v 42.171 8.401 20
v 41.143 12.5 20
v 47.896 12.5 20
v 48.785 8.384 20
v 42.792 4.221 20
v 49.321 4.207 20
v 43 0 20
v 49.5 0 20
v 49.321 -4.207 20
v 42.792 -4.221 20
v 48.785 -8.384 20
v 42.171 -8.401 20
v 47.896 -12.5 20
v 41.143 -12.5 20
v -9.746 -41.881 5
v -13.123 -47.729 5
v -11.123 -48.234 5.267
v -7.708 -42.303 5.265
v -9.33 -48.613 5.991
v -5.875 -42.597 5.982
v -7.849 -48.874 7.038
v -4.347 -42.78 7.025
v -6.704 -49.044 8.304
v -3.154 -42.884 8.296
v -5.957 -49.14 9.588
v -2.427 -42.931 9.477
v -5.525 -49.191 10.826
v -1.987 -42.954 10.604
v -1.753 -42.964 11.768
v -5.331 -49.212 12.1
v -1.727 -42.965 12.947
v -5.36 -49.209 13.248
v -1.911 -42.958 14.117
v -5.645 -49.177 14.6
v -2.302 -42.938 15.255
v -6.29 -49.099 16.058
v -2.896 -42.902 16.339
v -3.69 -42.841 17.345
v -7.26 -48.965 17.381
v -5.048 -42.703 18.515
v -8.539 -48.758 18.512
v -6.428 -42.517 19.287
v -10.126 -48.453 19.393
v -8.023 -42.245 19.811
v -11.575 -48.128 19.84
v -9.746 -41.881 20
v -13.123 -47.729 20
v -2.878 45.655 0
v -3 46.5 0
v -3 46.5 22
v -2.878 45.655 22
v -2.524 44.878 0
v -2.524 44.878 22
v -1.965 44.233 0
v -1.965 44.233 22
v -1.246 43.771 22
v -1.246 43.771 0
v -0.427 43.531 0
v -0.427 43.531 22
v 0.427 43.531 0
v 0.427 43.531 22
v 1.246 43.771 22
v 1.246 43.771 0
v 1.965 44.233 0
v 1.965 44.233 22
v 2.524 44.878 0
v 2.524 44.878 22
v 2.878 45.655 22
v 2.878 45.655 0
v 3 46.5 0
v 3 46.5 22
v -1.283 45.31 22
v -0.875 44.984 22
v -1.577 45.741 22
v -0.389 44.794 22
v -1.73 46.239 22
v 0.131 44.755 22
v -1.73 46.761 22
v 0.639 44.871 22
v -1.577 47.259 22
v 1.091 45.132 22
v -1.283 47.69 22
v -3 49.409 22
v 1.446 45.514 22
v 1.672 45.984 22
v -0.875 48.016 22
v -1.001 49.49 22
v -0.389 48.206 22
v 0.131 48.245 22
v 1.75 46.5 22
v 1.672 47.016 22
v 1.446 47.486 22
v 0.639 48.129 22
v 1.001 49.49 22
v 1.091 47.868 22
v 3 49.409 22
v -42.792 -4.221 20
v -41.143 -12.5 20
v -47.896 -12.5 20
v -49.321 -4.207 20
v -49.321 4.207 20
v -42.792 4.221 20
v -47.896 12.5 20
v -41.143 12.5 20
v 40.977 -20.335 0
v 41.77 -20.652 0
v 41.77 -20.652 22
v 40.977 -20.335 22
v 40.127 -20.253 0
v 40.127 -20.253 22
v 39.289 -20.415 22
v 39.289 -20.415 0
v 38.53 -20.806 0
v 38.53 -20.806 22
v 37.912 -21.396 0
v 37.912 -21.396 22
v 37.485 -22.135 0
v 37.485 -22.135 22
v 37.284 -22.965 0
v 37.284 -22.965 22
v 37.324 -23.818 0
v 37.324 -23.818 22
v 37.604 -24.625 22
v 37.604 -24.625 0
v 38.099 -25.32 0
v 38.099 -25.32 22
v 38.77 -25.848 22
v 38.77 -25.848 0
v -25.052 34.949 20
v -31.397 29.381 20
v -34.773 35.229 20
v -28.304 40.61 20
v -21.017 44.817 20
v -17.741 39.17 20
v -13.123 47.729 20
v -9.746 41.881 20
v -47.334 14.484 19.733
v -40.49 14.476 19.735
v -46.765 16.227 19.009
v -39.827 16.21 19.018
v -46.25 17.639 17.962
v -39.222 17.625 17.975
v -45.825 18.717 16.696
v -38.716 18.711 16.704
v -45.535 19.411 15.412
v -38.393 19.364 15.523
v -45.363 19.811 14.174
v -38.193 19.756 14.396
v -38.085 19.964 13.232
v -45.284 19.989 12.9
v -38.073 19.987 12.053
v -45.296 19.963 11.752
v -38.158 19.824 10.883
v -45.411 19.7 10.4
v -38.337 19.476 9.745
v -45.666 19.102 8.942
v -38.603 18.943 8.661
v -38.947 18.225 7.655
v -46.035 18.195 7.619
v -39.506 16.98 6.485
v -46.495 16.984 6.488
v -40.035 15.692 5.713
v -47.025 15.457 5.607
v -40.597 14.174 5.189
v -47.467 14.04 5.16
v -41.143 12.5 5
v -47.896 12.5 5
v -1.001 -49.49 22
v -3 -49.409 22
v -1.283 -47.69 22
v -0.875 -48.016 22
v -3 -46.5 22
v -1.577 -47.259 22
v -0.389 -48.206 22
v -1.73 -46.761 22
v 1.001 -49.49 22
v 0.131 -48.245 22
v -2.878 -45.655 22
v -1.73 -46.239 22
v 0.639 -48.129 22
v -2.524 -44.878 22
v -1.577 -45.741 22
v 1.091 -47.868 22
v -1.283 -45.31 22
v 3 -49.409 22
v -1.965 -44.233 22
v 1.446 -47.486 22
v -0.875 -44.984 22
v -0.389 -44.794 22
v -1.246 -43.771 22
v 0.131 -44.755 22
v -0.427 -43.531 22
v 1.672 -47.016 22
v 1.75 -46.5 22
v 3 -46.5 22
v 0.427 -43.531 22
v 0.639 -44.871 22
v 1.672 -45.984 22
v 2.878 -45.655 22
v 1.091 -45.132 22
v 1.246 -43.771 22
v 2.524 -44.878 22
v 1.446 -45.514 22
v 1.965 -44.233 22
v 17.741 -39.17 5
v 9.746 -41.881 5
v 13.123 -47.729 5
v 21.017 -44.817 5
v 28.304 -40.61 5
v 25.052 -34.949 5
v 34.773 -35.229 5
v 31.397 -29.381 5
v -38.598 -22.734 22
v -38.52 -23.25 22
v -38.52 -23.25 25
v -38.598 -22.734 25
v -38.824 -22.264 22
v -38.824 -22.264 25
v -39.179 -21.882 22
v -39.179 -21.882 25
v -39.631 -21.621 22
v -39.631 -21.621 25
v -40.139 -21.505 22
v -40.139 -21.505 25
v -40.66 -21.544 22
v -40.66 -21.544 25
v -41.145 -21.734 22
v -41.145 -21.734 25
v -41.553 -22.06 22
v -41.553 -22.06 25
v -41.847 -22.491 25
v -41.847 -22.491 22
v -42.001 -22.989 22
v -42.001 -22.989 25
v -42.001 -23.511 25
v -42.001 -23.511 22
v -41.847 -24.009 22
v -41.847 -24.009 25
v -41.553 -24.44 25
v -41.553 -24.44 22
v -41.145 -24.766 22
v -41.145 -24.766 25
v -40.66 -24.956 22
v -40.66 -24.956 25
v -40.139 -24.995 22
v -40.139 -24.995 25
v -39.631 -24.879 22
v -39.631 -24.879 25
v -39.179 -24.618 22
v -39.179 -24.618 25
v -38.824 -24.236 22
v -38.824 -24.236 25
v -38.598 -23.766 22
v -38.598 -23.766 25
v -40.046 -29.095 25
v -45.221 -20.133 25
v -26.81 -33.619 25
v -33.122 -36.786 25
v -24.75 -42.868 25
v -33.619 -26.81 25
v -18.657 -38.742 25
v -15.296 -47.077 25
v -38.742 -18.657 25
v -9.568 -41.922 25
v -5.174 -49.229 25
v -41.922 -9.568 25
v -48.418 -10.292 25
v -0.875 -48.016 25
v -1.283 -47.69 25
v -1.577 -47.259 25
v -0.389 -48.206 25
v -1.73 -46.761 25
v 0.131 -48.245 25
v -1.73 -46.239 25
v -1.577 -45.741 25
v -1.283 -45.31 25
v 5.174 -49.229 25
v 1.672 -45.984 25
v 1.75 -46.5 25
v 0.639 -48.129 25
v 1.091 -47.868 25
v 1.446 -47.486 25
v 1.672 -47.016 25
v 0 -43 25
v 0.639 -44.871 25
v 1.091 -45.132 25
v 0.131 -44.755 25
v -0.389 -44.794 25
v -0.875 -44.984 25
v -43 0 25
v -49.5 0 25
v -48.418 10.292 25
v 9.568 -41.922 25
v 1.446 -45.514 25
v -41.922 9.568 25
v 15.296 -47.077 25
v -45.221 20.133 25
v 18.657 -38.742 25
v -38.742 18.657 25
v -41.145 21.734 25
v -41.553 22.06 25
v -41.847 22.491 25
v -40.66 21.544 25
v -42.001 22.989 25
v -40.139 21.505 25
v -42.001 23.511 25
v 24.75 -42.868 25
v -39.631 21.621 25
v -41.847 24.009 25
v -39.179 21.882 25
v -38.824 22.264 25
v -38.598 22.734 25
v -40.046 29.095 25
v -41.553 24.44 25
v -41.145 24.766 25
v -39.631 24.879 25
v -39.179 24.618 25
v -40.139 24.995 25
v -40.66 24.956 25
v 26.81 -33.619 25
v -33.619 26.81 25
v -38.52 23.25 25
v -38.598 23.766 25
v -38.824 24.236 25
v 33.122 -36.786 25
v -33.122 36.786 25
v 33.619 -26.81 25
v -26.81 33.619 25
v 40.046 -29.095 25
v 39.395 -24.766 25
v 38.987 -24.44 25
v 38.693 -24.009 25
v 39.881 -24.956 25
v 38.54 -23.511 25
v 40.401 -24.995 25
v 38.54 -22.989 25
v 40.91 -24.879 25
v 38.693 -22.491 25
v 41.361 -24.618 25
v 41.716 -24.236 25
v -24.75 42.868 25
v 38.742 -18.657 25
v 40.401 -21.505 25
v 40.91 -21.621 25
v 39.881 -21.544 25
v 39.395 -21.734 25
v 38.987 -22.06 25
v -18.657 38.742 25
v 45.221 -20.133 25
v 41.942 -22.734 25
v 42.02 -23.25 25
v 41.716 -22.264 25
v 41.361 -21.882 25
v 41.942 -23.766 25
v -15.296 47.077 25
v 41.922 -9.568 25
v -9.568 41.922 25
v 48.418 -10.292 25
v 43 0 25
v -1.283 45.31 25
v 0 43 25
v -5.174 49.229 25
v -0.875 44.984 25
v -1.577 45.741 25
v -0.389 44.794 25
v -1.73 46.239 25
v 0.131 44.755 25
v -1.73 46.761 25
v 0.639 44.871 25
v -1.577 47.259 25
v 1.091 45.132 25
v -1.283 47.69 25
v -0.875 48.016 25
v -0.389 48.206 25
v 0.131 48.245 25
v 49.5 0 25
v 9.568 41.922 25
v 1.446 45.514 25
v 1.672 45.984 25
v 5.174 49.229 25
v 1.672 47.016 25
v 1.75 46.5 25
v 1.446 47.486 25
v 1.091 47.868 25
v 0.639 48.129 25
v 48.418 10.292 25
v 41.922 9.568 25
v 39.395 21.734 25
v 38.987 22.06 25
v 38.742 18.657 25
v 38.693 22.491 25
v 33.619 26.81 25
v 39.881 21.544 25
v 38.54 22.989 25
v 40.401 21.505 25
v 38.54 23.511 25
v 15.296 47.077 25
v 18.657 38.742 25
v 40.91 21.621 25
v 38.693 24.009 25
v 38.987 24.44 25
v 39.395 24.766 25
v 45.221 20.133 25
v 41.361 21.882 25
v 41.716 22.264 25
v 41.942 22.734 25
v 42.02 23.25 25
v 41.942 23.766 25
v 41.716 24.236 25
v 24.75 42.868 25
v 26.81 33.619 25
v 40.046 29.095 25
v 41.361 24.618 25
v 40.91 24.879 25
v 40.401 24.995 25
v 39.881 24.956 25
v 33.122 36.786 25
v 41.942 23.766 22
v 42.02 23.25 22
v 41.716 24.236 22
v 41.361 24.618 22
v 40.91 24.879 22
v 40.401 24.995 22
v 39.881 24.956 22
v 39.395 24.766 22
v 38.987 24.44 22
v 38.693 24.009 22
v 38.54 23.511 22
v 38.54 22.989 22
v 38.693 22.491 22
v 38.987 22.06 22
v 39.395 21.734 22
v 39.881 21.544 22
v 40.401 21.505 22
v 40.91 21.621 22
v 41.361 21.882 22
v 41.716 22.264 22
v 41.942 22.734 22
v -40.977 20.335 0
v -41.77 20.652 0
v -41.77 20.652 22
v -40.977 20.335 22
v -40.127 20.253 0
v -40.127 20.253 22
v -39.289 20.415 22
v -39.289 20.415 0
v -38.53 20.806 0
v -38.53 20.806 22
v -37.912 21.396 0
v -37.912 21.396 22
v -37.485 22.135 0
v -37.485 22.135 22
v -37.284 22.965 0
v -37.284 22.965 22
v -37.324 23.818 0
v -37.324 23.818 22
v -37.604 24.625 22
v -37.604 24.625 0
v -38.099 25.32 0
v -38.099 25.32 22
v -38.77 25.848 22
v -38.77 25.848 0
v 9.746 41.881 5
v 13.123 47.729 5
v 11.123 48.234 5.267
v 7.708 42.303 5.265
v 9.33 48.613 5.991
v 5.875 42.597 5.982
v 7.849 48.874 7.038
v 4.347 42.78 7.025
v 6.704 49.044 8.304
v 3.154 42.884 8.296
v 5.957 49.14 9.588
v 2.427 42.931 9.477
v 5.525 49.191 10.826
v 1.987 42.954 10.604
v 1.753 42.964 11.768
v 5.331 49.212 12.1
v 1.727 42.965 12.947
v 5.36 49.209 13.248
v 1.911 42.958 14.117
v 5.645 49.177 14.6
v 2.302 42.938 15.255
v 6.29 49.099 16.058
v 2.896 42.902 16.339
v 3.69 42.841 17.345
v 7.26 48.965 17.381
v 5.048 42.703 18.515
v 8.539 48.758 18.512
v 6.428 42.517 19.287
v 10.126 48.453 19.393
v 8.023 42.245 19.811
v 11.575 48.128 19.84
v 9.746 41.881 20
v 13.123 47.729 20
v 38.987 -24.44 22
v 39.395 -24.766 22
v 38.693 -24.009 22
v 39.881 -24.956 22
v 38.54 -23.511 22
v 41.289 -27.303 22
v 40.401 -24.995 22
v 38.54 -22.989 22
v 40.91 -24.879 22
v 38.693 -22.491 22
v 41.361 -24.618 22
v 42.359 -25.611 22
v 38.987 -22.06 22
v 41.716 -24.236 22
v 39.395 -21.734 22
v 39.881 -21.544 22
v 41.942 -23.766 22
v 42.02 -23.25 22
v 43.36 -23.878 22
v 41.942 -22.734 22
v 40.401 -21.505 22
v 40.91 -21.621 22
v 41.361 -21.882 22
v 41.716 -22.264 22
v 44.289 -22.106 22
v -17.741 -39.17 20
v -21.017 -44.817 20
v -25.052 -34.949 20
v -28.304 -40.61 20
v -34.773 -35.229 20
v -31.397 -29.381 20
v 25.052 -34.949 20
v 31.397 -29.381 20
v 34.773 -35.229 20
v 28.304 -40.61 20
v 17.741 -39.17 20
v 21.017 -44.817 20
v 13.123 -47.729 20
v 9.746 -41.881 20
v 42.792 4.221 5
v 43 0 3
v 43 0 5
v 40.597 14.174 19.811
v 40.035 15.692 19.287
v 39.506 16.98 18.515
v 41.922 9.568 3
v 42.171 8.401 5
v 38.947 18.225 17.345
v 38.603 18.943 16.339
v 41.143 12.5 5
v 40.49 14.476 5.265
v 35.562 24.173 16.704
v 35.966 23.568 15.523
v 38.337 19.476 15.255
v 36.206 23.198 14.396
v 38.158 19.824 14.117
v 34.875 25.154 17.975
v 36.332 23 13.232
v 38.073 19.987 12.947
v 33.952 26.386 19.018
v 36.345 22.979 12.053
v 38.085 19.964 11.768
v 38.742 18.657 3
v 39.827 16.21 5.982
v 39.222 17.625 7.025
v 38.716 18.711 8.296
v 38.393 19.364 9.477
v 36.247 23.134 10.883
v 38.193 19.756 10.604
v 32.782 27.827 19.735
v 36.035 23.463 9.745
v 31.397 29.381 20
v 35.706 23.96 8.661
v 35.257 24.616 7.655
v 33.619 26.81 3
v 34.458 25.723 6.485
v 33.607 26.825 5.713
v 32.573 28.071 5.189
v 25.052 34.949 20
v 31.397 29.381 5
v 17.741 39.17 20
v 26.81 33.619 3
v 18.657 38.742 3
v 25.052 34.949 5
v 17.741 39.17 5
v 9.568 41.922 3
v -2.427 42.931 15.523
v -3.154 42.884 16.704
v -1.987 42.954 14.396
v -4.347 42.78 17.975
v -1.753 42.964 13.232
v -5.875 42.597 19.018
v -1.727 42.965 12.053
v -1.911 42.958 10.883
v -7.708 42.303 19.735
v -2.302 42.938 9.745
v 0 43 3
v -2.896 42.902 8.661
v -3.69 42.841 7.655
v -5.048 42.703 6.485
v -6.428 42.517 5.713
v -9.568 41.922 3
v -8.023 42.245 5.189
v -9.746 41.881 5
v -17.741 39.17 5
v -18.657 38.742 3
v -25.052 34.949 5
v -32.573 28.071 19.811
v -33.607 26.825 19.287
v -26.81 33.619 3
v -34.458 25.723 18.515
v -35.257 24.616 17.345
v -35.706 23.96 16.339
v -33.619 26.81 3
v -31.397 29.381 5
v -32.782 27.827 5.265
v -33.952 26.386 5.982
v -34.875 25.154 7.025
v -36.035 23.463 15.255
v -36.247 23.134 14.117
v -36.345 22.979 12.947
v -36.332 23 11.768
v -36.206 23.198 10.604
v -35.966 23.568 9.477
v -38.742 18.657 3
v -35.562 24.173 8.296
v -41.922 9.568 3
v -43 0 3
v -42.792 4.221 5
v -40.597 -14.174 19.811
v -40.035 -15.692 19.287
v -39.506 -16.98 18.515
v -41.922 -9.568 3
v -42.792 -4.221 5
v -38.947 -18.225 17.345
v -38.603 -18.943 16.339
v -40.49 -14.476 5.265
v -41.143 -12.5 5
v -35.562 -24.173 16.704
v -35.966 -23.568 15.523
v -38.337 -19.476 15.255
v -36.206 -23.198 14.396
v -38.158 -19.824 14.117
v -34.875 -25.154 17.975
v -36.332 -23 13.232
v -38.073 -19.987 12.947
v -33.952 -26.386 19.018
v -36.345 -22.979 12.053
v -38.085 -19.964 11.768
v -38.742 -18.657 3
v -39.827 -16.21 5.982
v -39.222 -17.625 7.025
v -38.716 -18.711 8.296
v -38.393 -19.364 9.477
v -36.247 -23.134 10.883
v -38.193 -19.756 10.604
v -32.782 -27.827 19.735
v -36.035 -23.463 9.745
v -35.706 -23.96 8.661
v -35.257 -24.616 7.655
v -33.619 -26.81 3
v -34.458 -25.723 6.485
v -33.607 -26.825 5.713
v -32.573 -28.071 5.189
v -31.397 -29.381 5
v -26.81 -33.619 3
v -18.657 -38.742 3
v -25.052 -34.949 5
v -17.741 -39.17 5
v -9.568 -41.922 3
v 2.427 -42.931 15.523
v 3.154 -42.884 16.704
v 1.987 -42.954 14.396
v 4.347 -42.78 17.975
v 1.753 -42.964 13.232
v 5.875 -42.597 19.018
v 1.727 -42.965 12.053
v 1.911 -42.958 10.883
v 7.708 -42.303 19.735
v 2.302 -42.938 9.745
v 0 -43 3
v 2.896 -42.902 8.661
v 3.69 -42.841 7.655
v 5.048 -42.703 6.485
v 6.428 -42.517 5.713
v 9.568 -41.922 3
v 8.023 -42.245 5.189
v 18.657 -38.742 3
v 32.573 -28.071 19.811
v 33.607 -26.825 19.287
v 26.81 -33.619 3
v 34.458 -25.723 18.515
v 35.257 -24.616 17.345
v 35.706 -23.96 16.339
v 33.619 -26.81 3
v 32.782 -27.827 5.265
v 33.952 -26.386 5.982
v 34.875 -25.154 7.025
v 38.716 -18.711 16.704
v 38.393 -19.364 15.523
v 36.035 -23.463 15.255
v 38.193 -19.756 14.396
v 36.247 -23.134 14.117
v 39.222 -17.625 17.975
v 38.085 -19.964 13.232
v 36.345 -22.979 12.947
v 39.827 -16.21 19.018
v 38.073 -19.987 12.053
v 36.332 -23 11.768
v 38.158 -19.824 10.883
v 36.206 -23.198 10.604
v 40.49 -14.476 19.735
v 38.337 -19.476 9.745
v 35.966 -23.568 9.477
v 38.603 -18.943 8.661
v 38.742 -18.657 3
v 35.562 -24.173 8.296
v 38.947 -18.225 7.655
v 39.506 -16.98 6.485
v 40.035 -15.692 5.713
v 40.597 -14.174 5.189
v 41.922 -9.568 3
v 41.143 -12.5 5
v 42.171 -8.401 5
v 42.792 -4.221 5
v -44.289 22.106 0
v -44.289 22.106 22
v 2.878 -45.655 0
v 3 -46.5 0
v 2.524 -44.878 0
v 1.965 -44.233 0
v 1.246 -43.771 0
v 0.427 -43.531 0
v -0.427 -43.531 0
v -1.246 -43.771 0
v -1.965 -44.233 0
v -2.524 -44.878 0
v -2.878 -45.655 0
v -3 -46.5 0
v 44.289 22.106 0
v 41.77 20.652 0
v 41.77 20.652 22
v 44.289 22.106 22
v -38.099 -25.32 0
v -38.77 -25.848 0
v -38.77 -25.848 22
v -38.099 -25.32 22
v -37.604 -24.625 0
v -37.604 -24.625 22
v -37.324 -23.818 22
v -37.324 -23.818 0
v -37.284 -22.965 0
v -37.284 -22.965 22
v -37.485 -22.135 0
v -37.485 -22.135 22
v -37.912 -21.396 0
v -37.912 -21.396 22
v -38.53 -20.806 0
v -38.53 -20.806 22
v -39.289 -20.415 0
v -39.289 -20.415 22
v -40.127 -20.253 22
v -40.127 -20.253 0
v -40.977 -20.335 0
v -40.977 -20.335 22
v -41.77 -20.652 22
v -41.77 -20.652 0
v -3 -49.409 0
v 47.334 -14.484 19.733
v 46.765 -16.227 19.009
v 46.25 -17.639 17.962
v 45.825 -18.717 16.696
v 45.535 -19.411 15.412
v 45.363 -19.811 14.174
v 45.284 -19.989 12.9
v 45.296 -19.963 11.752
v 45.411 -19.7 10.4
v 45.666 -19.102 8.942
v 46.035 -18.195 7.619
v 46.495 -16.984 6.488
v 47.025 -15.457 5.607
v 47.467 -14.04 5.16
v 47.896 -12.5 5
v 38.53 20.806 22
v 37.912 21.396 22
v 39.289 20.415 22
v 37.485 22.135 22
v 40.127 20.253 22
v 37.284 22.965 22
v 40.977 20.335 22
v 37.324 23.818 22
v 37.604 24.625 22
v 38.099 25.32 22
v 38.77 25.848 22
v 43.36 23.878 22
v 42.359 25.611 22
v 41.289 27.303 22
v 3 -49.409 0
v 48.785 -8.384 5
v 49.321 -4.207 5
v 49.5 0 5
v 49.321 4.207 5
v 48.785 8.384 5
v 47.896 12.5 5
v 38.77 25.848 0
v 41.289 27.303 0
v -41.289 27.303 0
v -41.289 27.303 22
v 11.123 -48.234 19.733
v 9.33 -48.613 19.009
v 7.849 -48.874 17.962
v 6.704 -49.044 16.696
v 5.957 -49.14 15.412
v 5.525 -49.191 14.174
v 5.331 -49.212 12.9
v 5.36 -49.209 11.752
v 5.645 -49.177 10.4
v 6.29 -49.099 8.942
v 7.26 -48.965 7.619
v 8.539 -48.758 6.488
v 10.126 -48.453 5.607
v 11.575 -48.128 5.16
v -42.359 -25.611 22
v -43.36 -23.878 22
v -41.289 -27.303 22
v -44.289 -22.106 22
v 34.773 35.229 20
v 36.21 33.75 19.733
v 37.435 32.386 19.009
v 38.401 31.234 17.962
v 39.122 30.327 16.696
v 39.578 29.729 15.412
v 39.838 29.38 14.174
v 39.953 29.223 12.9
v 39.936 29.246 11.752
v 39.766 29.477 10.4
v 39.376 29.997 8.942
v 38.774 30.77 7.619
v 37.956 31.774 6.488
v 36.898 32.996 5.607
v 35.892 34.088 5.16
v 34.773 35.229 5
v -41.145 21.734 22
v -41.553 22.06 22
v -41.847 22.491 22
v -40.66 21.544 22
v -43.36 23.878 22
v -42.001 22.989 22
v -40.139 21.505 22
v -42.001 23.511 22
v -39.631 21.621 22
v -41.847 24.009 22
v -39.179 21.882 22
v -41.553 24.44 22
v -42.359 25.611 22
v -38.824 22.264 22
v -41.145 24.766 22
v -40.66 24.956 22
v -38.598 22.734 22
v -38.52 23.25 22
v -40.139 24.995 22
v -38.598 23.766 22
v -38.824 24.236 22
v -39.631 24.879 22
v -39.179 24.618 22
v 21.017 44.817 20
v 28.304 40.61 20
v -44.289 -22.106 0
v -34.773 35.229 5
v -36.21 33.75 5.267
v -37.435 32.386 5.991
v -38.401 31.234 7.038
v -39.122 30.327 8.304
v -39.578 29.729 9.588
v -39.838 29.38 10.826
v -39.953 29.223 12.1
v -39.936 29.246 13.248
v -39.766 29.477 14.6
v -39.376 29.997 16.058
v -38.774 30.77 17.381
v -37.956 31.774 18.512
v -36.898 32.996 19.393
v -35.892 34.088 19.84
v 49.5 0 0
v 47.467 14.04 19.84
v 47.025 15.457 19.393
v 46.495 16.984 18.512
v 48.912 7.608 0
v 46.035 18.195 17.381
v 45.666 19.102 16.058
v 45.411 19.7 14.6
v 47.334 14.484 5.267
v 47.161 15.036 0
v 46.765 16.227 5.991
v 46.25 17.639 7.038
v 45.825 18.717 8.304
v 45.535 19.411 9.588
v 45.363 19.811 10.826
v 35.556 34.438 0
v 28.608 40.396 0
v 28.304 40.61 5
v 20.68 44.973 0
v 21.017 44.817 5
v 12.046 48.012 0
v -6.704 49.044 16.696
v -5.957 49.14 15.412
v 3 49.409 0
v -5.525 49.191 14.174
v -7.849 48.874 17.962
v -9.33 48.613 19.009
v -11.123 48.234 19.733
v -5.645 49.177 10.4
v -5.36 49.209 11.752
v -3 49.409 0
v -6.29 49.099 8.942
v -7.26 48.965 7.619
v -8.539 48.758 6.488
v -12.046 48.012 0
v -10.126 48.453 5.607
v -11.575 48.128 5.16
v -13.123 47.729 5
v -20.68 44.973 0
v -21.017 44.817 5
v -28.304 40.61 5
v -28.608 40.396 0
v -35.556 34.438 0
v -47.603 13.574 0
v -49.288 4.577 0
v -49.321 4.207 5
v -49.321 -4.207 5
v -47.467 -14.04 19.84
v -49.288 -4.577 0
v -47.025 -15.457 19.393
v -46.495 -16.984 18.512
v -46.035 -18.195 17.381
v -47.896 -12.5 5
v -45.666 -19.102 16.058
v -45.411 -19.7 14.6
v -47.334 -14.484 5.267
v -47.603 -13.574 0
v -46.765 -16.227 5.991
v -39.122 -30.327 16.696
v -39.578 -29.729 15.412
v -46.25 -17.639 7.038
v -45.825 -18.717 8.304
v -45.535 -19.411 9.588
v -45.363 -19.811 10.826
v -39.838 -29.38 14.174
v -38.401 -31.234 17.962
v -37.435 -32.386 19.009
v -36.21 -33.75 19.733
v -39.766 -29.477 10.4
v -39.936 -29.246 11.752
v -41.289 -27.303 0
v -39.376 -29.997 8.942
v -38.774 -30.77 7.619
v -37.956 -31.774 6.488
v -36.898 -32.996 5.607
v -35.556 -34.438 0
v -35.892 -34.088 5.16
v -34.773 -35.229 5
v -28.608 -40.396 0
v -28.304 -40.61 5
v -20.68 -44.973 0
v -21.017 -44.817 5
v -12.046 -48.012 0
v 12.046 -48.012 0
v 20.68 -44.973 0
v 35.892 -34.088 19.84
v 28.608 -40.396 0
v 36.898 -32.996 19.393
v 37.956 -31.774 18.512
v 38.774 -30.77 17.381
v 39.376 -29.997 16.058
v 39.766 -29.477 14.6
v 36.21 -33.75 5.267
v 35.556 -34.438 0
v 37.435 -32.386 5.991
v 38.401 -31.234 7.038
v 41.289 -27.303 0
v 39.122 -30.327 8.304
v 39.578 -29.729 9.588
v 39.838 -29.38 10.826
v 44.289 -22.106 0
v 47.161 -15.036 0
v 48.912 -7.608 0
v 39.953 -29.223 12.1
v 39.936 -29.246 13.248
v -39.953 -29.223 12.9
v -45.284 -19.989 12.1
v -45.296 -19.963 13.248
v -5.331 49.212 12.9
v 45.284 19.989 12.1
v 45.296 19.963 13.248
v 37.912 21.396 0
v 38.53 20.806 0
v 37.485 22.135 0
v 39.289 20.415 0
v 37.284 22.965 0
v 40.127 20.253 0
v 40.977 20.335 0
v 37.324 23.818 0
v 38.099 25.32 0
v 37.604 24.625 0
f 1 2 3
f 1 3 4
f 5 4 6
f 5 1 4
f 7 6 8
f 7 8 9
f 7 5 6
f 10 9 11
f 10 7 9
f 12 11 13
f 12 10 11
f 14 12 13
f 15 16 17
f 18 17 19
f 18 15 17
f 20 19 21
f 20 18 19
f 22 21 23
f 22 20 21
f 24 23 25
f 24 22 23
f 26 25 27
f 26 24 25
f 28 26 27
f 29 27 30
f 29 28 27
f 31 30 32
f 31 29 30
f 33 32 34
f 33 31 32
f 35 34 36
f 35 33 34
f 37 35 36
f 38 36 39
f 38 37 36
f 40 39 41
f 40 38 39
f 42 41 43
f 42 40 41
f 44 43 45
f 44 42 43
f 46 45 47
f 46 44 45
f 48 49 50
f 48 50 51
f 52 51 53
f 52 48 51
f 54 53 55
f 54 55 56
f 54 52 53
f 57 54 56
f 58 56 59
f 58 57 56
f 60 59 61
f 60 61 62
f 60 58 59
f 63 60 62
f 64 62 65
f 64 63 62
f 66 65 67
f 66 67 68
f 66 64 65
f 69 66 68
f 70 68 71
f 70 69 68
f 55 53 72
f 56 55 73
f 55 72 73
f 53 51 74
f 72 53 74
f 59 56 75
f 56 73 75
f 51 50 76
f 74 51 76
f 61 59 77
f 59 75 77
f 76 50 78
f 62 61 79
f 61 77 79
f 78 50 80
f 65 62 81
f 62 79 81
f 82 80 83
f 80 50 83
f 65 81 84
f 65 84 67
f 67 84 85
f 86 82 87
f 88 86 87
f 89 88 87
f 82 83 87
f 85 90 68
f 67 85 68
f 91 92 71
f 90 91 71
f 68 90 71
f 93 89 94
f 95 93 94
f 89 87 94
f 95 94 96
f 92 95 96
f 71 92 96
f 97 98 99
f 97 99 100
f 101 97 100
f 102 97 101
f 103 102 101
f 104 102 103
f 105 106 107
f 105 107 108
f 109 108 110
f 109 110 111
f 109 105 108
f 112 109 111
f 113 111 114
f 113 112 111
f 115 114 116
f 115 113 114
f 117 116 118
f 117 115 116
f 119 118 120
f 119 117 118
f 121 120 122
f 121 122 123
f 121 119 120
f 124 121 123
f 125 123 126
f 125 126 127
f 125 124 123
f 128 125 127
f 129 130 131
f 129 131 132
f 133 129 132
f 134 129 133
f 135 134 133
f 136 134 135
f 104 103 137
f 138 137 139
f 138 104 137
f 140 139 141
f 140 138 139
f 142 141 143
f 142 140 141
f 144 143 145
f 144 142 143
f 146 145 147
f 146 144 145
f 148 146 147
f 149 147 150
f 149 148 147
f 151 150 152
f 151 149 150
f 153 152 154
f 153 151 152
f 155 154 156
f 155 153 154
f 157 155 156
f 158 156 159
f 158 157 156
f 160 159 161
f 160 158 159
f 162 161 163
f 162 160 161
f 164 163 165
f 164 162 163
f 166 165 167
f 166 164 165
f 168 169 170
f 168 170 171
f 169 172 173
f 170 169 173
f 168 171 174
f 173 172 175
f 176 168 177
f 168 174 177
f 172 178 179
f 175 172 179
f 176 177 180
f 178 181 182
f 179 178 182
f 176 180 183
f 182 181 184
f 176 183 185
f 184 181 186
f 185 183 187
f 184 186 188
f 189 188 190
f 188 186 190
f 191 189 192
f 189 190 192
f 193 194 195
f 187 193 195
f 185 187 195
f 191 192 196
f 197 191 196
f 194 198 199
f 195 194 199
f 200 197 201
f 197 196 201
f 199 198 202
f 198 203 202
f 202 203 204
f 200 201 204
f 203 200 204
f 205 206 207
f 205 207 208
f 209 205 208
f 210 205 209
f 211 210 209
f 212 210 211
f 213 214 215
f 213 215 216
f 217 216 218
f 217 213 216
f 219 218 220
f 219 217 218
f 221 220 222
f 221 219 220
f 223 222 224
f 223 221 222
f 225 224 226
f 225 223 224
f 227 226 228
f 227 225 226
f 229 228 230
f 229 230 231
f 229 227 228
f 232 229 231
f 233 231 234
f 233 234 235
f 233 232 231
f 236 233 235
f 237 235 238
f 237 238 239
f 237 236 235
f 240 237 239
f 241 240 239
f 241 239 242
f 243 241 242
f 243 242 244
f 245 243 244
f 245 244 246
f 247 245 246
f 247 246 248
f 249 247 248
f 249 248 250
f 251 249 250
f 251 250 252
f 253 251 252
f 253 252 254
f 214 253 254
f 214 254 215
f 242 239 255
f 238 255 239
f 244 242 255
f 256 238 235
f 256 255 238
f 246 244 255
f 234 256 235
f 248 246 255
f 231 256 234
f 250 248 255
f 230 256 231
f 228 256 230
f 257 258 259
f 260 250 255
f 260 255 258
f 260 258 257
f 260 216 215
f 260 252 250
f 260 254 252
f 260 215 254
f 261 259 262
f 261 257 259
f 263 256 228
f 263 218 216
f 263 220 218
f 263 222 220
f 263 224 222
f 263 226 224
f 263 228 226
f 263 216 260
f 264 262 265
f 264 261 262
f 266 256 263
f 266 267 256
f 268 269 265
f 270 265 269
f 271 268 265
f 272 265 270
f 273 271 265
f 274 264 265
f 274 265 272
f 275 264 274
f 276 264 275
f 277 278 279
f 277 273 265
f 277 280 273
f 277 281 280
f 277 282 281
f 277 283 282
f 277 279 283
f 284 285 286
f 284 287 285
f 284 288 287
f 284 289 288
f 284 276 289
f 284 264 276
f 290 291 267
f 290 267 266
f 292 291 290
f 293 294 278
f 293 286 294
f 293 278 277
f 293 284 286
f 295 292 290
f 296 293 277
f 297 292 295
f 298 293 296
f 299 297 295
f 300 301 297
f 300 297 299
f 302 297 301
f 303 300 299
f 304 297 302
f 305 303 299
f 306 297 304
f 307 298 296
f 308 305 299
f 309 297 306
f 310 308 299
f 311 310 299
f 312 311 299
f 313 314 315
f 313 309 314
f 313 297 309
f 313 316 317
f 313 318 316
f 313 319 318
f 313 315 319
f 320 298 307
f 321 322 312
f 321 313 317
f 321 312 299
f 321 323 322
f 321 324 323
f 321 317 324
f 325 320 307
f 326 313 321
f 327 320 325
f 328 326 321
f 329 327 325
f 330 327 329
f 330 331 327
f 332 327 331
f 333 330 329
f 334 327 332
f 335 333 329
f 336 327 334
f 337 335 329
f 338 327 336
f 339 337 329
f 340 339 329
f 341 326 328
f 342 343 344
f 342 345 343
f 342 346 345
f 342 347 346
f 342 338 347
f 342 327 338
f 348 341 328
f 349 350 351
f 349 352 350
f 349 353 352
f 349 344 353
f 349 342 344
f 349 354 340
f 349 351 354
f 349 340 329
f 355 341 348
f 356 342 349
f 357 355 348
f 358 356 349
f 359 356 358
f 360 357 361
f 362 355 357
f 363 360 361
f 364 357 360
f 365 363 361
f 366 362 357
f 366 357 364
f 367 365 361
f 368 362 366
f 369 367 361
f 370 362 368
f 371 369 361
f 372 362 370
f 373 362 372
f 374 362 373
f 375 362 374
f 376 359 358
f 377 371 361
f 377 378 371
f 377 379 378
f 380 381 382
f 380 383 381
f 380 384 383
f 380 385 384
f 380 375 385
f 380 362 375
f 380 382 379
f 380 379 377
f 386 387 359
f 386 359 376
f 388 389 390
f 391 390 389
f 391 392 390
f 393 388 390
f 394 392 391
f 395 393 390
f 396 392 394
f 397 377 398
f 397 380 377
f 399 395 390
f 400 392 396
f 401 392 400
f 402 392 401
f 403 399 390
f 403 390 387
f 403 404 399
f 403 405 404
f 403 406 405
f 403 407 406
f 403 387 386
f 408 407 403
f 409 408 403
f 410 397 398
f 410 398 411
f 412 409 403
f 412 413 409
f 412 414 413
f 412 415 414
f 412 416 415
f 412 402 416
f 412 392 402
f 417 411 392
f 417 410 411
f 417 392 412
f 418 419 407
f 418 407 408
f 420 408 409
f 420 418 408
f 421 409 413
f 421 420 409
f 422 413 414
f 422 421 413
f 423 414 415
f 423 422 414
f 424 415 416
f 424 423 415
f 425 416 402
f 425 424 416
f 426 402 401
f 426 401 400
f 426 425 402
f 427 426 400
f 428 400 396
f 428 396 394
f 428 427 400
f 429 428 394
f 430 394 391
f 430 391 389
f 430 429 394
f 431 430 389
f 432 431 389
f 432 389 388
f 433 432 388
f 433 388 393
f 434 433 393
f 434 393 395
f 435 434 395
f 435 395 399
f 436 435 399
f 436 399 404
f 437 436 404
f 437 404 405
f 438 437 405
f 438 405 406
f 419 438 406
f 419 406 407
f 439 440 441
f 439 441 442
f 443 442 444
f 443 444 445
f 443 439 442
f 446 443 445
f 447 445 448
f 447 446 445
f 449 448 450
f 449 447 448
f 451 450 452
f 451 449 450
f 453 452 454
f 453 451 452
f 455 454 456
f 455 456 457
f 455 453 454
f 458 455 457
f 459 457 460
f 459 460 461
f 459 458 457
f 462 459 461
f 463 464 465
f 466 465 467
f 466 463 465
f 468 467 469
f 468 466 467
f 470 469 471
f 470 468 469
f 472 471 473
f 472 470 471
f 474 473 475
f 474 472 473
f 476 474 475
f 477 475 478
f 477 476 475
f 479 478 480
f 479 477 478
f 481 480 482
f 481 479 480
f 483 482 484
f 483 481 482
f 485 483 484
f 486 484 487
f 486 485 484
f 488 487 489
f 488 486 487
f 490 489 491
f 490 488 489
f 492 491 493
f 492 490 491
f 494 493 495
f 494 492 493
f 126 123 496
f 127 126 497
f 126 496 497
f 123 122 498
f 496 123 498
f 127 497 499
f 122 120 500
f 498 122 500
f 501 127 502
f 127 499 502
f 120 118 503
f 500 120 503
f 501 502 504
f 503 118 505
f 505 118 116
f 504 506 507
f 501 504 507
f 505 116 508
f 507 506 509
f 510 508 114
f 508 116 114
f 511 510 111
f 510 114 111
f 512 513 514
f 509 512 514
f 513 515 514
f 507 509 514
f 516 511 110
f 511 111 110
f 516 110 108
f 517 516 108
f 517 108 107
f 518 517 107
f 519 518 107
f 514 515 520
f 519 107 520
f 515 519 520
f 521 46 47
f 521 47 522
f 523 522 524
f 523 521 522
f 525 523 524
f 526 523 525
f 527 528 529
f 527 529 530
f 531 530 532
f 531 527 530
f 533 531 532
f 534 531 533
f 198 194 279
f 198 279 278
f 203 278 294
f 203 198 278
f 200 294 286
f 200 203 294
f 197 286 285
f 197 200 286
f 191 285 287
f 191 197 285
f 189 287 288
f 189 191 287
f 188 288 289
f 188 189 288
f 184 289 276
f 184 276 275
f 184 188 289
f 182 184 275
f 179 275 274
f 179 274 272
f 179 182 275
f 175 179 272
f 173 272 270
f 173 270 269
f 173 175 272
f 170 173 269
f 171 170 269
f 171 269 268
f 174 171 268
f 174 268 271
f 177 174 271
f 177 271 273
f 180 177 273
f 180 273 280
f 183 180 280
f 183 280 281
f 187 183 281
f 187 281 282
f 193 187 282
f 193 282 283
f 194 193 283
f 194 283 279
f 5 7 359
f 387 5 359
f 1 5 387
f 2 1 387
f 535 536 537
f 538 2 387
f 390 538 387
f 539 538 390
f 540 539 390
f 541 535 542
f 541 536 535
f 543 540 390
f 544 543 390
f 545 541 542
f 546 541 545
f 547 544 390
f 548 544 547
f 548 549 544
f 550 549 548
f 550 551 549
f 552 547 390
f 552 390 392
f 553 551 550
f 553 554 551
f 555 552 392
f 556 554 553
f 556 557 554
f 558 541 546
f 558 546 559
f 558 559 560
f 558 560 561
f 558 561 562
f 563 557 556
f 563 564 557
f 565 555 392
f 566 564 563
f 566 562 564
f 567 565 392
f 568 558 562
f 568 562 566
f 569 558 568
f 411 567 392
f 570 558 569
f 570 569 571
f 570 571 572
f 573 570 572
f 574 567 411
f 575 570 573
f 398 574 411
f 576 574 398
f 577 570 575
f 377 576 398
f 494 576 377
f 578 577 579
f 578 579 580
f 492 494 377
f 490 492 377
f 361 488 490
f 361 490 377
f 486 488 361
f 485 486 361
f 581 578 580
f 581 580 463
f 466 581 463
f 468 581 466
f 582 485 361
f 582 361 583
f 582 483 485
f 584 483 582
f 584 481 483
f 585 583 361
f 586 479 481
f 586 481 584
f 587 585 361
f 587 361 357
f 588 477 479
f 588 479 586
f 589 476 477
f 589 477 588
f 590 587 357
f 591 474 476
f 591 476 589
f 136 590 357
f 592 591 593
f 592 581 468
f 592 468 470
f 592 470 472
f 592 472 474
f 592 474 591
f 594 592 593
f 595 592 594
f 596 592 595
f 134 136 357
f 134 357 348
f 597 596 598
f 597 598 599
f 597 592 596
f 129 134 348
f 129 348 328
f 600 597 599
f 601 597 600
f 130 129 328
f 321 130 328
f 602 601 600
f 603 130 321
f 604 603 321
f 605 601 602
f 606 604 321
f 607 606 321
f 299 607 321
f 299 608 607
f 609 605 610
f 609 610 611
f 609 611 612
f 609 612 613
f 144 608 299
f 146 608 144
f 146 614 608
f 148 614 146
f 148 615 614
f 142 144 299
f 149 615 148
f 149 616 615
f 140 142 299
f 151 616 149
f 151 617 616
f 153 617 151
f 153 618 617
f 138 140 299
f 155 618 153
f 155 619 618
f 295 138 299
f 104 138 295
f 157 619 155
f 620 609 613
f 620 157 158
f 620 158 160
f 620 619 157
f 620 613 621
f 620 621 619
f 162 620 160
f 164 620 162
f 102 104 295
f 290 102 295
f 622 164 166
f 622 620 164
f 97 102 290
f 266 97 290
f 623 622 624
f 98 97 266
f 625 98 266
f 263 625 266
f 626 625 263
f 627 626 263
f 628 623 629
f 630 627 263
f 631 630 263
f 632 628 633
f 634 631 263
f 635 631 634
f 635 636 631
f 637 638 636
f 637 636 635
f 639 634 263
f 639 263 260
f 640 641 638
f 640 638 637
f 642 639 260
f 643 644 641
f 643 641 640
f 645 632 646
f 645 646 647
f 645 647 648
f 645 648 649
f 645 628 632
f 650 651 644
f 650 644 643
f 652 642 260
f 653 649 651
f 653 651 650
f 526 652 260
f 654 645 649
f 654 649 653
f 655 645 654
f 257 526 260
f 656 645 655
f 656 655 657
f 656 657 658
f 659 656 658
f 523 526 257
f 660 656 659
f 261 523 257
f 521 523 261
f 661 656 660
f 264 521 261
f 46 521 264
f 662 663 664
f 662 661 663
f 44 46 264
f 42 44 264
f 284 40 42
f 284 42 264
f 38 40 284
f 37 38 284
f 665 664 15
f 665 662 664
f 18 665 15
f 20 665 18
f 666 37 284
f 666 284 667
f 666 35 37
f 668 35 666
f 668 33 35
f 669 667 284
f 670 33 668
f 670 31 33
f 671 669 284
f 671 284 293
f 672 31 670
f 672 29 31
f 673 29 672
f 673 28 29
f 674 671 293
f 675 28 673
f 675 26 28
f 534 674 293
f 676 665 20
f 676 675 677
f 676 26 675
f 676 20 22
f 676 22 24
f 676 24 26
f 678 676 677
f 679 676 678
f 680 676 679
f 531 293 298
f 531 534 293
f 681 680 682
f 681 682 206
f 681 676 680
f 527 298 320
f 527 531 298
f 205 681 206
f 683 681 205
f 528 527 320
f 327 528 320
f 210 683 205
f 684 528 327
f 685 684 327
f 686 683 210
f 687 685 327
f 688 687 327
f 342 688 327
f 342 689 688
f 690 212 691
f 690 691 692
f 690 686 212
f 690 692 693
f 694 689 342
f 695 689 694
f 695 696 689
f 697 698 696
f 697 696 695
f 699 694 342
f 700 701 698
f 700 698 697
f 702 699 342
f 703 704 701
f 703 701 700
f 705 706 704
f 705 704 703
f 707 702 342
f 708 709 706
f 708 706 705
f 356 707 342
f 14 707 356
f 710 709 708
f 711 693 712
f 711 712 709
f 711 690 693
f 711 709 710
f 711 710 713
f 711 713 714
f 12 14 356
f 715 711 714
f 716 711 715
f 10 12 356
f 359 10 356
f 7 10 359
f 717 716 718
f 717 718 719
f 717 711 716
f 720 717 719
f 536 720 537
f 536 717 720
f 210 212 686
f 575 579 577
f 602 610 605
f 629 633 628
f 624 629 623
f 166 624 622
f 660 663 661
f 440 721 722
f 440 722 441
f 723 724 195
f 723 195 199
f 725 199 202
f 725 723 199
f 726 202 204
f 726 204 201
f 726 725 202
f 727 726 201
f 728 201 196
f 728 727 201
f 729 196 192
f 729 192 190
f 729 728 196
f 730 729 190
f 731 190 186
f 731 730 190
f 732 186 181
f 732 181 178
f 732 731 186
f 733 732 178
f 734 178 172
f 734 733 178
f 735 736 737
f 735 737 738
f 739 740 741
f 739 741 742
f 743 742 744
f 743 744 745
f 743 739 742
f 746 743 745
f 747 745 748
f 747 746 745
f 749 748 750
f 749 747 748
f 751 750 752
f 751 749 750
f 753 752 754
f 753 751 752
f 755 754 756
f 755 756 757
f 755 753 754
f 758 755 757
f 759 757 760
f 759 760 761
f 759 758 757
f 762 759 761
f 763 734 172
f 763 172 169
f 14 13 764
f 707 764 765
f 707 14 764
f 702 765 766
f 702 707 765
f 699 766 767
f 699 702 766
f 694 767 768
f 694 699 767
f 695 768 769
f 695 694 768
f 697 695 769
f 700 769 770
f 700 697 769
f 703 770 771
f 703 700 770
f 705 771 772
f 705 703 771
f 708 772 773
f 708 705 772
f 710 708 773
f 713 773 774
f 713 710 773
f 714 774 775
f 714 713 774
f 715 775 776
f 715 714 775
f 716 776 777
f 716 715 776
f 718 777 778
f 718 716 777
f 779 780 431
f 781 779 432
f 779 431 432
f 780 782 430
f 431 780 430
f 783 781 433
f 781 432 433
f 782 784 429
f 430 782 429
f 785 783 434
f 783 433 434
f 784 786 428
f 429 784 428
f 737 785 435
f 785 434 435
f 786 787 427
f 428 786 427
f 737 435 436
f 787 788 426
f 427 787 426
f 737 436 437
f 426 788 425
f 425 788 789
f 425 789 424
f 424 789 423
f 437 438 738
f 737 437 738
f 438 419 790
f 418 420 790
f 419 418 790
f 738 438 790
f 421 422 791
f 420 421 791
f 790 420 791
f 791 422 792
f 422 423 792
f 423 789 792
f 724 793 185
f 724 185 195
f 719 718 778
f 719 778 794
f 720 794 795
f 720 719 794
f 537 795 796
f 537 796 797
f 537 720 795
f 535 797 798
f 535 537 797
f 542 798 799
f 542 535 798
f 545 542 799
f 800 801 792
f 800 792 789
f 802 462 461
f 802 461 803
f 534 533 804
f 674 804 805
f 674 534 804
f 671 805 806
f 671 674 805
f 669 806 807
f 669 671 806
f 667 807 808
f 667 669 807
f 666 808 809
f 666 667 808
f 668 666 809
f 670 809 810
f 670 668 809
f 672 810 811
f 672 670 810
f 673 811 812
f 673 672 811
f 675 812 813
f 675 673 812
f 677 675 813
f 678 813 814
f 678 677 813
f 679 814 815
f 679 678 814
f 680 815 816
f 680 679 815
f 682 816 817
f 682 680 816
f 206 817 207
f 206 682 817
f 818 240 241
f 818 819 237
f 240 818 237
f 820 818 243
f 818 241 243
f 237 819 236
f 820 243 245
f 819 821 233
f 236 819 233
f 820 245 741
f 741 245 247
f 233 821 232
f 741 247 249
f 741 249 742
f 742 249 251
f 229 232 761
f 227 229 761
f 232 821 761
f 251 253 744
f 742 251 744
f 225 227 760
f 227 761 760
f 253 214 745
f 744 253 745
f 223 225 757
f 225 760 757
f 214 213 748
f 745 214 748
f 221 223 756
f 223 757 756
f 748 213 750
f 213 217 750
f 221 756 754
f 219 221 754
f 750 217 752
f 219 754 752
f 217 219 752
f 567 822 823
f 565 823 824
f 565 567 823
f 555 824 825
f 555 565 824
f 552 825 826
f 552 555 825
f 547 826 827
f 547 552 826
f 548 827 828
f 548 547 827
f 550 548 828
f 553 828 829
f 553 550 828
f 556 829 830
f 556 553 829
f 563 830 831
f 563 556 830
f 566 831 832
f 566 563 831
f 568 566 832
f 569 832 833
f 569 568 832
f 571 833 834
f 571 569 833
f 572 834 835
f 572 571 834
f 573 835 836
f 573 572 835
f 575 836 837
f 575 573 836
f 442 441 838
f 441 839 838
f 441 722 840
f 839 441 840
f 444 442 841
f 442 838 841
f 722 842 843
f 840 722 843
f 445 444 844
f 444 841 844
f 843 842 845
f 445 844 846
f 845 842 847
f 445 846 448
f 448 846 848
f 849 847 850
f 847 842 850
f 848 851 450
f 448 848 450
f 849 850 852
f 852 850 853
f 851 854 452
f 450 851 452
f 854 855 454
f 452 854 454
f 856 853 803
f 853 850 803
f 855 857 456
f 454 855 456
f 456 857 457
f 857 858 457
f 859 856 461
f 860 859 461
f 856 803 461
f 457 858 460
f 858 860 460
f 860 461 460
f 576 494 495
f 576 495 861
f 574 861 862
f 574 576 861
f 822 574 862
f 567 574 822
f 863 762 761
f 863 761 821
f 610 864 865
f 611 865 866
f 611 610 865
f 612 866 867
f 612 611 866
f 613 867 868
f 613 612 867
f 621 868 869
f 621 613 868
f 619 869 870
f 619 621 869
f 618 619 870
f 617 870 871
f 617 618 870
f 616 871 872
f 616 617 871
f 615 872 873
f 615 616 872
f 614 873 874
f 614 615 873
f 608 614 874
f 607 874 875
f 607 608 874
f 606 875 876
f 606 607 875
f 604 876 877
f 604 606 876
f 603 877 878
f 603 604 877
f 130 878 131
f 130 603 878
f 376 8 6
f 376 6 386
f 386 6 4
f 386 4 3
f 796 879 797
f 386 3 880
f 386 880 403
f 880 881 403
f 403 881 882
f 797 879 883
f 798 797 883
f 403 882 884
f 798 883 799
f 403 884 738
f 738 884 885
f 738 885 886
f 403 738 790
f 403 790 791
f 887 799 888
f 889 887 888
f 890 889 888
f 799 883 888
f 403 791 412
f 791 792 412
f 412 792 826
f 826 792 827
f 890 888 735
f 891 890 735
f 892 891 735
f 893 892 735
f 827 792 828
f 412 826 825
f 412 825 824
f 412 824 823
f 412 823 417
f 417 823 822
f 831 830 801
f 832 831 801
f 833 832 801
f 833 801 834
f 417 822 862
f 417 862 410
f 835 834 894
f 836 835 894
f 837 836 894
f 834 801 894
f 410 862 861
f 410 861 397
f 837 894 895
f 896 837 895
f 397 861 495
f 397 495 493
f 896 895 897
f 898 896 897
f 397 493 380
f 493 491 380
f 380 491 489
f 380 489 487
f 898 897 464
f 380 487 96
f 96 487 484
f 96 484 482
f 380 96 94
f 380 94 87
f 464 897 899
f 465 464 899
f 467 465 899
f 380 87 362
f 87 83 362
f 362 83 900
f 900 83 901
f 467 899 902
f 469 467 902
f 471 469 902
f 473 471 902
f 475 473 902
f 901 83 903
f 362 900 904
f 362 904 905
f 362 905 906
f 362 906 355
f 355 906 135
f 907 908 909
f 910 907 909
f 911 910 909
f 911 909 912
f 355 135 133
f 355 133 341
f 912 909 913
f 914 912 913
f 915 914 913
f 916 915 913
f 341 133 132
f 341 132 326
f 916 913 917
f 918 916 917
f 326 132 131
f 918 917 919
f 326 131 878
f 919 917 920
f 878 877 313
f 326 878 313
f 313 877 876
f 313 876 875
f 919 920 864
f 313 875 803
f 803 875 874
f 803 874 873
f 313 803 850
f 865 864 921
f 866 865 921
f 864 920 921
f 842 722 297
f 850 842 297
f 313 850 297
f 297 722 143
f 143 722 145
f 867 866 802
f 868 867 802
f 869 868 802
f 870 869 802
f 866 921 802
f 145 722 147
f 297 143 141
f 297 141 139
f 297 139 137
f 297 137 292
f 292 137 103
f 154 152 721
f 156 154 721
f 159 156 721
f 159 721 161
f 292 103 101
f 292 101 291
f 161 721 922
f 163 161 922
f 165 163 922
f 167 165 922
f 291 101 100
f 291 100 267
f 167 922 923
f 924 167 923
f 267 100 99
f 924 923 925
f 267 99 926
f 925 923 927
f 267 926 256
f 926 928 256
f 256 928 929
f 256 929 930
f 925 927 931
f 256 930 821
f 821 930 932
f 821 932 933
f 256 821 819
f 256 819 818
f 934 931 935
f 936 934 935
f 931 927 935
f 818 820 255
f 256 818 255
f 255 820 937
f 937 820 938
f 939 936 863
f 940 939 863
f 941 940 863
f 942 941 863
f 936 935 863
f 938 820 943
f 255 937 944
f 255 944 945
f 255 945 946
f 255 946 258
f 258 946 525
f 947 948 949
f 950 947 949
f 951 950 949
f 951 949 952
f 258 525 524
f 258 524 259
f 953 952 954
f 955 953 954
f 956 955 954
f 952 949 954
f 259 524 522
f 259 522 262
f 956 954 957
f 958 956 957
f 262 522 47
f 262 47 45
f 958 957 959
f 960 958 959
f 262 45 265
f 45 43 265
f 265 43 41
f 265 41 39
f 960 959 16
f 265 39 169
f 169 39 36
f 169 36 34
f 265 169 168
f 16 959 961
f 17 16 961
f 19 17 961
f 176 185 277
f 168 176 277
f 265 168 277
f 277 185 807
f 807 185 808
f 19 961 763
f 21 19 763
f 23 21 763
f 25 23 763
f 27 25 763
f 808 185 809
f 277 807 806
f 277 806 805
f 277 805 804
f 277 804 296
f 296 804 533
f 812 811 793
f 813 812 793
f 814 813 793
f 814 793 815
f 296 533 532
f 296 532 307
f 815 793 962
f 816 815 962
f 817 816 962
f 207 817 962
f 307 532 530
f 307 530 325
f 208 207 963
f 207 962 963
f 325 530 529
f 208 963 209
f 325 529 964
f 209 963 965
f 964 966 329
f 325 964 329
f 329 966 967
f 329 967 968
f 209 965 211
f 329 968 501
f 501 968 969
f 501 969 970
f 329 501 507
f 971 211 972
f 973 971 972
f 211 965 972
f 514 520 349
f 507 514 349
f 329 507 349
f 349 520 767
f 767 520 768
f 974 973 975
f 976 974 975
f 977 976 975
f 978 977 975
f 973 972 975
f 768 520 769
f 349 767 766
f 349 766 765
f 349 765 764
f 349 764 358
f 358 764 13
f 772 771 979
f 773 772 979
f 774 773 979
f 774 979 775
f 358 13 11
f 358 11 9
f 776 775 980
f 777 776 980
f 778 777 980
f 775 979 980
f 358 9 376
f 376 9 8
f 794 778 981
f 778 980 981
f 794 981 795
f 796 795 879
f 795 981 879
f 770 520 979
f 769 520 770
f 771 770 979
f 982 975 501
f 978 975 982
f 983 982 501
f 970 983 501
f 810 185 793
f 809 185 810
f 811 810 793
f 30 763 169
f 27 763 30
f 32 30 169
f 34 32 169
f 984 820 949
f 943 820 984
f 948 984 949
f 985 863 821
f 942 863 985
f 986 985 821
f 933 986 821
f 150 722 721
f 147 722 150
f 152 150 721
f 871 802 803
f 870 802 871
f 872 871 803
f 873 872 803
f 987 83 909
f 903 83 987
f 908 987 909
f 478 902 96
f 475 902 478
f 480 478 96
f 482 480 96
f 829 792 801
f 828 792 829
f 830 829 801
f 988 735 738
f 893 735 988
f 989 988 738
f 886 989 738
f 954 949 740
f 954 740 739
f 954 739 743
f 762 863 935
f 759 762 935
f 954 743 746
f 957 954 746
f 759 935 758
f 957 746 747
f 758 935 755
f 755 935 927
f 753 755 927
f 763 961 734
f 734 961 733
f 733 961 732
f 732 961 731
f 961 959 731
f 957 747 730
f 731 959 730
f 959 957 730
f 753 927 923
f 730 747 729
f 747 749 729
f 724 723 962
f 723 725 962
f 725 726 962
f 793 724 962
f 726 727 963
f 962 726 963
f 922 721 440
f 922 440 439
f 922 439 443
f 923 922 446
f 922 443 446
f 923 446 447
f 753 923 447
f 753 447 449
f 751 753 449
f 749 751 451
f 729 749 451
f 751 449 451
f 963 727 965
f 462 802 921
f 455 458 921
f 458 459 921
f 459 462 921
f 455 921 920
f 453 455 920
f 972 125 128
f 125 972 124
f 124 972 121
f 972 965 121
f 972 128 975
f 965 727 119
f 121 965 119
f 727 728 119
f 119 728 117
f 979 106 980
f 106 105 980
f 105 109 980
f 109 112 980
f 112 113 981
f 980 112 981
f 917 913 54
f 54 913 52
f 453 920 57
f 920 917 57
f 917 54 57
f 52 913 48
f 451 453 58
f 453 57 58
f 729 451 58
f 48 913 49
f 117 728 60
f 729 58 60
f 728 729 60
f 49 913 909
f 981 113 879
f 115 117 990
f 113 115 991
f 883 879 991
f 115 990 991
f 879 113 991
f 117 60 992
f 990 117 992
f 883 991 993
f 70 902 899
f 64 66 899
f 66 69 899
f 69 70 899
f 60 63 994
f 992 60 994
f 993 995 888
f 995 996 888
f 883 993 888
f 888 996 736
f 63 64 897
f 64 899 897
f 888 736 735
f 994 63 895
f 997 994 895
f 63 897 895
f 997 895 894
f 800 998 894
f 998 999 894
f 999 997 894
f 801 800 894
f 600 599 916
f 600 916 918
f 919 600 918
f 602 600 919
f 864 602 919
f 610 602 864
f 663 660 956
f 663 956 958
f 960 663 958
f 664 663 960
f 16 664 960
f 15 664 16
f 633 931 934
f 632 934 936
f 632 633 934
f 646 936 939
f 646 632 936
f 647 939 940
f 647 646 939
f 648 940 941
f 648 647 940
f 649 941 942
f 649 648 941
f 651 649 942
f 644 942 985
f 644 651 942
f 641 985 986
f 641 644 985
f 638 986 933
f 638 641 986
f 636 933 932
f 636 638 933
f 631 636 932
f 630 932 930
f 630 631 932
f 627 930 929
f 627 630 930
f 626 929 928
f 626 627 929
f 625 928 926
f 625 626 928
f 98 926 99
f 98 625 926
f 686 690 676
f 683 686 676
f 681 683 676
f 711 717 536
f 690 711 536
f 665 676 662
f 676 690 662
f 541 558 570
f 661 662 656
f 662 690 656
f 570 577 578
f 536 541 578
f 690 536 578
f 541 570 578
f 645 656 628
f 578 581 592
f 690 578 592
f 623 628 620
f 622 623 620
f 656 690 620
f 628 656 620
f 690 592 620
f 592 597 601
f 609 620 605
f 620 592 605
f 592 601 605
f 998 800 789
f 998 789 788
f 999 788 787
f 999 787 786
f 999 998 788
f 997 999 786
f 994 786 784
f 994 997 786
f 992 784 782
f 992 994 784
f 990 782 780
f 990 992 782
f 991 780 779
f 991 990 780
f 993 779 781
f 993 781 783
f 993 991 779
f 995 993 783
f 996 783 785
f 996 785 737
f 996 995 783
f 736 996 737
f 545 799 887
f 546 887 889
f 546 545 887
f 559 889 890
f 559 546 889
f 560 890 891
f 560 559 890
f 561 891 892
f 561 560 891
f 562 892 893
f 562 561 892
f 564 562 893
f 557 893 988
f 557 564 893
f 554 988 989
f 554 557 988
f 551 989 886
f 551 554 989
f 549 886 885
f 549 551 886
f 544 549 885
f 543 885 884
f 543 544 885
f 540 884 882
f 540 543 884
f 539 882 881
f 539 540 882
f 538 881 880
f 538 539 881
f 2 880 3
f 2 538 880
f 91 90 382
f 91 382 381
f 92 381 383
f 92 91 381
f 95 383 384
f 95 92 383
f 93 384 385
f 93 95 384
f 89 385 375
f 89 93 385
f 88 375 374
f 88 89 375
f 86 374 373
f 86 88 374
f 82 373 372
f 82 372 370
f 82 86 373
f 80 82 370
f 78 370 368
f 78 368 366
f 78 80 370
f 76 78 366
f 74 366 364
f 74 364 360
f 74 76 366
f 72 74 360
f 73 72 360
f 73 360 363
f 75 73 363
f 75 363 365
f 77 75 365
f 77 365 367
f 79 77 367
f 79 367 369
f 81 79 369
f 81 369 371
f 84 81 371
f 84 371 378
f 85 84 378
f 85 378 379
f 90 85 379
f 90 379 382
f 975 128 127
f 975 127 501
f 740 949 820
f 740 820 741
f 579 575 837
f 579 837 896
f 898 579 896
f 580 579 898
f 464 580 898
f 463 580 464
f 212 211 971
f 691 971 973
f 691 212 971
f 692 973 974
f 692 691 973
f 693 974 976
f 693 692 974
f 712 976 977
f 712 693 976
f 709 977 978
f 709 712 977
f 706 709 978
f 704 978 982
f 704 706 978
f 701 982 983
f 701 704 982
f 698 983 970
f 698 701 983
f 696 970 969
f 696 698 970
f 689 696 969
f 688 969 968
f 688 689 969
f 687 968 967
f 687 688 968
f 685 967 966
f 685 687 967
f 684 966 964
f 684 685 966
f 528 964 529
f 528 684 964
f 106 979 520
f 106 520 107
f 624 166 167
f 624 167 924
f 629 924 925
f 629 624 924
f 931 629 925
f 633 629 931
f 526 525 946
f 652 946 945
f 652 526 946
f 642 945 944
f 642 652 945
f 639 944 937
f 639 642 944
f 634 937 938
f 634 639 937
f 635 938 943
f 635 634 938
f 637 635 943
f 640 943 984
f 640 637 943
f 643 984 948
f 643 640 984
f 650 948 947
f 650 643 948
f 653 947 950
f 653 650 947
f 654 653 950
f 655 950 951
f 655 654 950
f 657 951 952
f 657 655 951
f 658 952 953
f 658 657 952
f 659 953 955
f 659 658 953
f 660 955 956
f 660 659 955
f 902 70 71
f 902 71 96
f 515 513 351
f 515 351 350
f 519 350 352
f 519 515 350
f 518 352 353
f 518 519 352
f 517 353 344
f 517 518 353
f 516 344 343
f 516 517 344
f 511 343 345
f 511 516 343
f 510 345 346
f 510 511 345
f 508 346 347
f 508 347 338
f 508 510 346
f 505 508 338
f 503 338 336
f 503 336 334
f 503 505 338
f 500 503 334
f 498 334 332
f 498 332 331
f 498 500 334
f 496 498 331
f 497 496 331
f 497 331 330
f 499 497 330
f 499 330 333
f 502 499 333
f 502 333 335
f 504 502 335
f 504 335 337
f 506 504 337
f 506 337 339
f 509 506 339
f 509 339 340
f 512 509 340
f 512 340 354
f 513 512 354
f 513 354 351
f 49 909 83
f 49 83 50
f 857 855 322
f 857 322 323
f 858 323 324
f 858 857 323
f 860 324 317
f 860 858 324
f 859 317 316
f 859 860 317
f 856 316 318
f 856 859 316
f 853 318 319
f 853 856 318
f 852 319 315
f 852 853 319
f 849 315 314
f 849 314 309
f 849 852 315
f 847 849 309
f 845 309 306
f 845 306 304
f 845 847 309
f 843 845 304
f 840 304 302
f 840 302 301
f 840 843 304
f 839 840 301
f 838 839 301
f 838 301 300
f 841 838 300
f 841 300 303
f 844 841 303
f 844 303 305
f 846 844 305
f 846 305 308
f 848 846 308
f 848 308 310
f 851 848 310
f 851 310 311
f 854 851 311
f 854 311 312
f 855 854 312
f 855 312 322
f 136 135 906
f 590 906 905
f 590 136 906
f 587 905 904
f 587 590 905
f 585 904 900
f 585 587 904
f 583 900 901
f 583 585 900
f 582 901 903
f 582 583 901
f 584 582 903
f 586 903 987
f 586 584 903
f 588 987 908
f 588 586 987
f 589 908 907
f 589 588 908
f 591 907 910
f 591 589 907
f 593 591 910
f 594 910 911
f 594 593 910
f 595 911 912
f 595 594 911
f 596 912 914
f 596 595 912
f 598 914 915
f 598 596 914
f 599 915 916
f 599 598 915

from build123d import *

# Parameters (mm, degrees)
SKETCH_1_R               = 49.5
SKETCH_1_R_2             = 43
SKETCH_1_R_3             = 1.75
EXTRUDE_1_DEPTH          = 25
CUT_EXTRUDE_1_DEPTH      = 59
PATTERN_CIRCULAR_1_COUNT = 6
SKETCH_3_R               = 44.045845484
EXTRUDE_2_DEPTH          = 3
CUT_EXTRUDE_3_DEPTH      = 22


with BuildPart() as part:
    # Эскиз1 → Бобышка-Вытянуть1 (new body)
    with BuildSketch(Plane.XY):
        Circle(SKETCH_1_R)
        Circle(SKETCH_1_R_2, mode=Mode.SUBTRACT)
        with Locations((0, 46.5)):
            Circle(SKETCH_1_R_3, mode=Mode.SUBTRACT)
        with Locations((40.270181276, 23.25)):
            Circle(SKETCH_1_R_3, mode=Mode.SUBTRACT)
        with Locations((40.270181276, -23.25)):
            Circle(SKETCH_1_R_3, mode=Mode.SUBTRACT)
        with Locations((0, -46.5)):
            Circle(SKETCH_1_R_3, mode=Mode.SUBTRACT)
        with Locations((-40.270181276, -23.25)):
            Circle(SKETCH_1_R_3, mode=Mode.SUBTRACT)
        with Locations((-40.270181276, 23.25)):
            Circle(SKETCH_1_R_3, mode=Mode.SUBTRACT)
    extrude(amount=EXTRUDE_1_DEPTH)

    # Эскиз2 → Вырез-Вытянуть1 (cut)
    with BuildSketch(Plane(origin=(0, 0, 0), x_dir=(0, 0, -1), z_dir=(1, 0, 0))):
        with BuildLine():
            Line((-5, 12.5), (-5, -12.5))
            ThreePointArc((-5, -12.5), (-12.5, -20), (-20, -12.5))
            Line((-20, -12.5), (-20, 12.5))
            ThreePointArc((-20, 12.5), (-12.5, 20), (-5, 12.5))
        make_face()
    cut_extrude_1 = extrude(amount=-CUT_EXTRUDE_1_DEPTH, mode=Mode.SUBTRACT)

    # Круговой массив1: Вырез-Вытянуть1 ×6 about axis
    pattern_circular_1_axis = Axis((0, 0, 25), (0, 0, -1))
    for i in range(1, PATTERN_CIRCULAR_1_COUNT):
        add(cut_extrude_1.rotate(pattern_circular_1_axis, i * 360 / PATTERN_CIRCULAR_1_COUNT), mode=Mode.SUBTRACT)

    # Эскиз3 → Бобышка-Вытянуть2 (add)
    with BuildSketch(Plane(origin=(0, 0, 0), x_dir=(-1, 0, 0), z_dir=(0, 0, -1))):
        Circle(SKETCH_3_R)
    extrude(amount=-EXTRUDE_2_DEPTH)

    # Эскиз4 → Вырез-Вытянуть3 (cut)
    with BuildSketch(Plane(origin=(0, 0, 0), x_dir=(-1, 0, 0), z_dir=(0, 0, -1))):
        with BuildLine():
            Line((-3, 46.5), (-3, 53.502718932))
            ThreePointArc((-3, 53.502718932), (0, 56.502718932), (3, 53.502718932))
            Line((3, 53.502718932), (3, 46.5))
            ThreePointArc((3, 46.5), (0, 43.5), (-3, 46.5))
        make_face()
        with BuildLine():
            Line((-41.770181276, 20.651923789), (-47.834713767, 24.153283255))
            ThreePointArc((-47.834713767, 24.153283255), (-48.932789978, 28.251359466), (-44.834713767, 29.349435677))
            Line((-44.834713767, 29.349435677), (-38.770181276, 25.848076211))
            ThreePointArc((-38.770181276, 25.848076211), (-37.672105065, 21.75), (-41.770181276, 20.651923789))
        make_face()
        with BuildLine():
            Line((-38.770181276, -25.848076211), (-44.834713767, -29.349435677))
            ThreePointArc((-44.834713767, -29.349435677), (-48.932789978, -28.251359466), (-47.834713767, -24.153283255))
            Line((-47.834713767, -24.153283255), (-41.770181276, -20.651923789))
            ThreePointArc((-41.770181276, -20.651923789), (-37.672105065, -21.75), (-38.770181276, -25.848076211))
        make_face()
        with BuildLine():
            Line((3, -46.5), (3, -53.502718932))
            ThreePointArc((3, -53.502718932), (0, -56.502718932), (-3, -53.502718932))
            Line((-3, -53.502718932), (-3, -46.5))
            ThreePointArc((-3, -46.5), (0, -43.5), (3, -46.5))
        make_face()
        with BuildLine():
            Line((41.770181276, -20.651923789), (47.834713767, -24.153283255))
            ThreePointArc((47.834713767, -24.153283255), (48.932789978, -28.251359466), (44.834713767, -29.349435677))
            Line((44.834713767, -29.349435677), (38.770181276, -25.848076211))
            ThreePointArc((38.770181276, -25.848076211), (37.672105065, -21.75), (41.770181276, -20.651923789))
        make_face()
        with BuildLine():
            Line((38.770181276, 25.848076211), (44.834713767, 29.349435677))
            ThreePointArc((44.834713767, 29.349435677), (48.932789978, 28.251359466), (47.834713767, 24.153283255))
            Line((47.834713767, 24.153283255), (41.770181276, 20.651923789))
            ThreePointArc((41.770181276, 20.651923789), (37.672105065, 21.75), (38.770181276, 25.848076211))
        make_face()
    extrude(amount=-CUT_EXTRUDE_3_DEPTH, mode=Mode.SUBTRACT)


solid = part.part
